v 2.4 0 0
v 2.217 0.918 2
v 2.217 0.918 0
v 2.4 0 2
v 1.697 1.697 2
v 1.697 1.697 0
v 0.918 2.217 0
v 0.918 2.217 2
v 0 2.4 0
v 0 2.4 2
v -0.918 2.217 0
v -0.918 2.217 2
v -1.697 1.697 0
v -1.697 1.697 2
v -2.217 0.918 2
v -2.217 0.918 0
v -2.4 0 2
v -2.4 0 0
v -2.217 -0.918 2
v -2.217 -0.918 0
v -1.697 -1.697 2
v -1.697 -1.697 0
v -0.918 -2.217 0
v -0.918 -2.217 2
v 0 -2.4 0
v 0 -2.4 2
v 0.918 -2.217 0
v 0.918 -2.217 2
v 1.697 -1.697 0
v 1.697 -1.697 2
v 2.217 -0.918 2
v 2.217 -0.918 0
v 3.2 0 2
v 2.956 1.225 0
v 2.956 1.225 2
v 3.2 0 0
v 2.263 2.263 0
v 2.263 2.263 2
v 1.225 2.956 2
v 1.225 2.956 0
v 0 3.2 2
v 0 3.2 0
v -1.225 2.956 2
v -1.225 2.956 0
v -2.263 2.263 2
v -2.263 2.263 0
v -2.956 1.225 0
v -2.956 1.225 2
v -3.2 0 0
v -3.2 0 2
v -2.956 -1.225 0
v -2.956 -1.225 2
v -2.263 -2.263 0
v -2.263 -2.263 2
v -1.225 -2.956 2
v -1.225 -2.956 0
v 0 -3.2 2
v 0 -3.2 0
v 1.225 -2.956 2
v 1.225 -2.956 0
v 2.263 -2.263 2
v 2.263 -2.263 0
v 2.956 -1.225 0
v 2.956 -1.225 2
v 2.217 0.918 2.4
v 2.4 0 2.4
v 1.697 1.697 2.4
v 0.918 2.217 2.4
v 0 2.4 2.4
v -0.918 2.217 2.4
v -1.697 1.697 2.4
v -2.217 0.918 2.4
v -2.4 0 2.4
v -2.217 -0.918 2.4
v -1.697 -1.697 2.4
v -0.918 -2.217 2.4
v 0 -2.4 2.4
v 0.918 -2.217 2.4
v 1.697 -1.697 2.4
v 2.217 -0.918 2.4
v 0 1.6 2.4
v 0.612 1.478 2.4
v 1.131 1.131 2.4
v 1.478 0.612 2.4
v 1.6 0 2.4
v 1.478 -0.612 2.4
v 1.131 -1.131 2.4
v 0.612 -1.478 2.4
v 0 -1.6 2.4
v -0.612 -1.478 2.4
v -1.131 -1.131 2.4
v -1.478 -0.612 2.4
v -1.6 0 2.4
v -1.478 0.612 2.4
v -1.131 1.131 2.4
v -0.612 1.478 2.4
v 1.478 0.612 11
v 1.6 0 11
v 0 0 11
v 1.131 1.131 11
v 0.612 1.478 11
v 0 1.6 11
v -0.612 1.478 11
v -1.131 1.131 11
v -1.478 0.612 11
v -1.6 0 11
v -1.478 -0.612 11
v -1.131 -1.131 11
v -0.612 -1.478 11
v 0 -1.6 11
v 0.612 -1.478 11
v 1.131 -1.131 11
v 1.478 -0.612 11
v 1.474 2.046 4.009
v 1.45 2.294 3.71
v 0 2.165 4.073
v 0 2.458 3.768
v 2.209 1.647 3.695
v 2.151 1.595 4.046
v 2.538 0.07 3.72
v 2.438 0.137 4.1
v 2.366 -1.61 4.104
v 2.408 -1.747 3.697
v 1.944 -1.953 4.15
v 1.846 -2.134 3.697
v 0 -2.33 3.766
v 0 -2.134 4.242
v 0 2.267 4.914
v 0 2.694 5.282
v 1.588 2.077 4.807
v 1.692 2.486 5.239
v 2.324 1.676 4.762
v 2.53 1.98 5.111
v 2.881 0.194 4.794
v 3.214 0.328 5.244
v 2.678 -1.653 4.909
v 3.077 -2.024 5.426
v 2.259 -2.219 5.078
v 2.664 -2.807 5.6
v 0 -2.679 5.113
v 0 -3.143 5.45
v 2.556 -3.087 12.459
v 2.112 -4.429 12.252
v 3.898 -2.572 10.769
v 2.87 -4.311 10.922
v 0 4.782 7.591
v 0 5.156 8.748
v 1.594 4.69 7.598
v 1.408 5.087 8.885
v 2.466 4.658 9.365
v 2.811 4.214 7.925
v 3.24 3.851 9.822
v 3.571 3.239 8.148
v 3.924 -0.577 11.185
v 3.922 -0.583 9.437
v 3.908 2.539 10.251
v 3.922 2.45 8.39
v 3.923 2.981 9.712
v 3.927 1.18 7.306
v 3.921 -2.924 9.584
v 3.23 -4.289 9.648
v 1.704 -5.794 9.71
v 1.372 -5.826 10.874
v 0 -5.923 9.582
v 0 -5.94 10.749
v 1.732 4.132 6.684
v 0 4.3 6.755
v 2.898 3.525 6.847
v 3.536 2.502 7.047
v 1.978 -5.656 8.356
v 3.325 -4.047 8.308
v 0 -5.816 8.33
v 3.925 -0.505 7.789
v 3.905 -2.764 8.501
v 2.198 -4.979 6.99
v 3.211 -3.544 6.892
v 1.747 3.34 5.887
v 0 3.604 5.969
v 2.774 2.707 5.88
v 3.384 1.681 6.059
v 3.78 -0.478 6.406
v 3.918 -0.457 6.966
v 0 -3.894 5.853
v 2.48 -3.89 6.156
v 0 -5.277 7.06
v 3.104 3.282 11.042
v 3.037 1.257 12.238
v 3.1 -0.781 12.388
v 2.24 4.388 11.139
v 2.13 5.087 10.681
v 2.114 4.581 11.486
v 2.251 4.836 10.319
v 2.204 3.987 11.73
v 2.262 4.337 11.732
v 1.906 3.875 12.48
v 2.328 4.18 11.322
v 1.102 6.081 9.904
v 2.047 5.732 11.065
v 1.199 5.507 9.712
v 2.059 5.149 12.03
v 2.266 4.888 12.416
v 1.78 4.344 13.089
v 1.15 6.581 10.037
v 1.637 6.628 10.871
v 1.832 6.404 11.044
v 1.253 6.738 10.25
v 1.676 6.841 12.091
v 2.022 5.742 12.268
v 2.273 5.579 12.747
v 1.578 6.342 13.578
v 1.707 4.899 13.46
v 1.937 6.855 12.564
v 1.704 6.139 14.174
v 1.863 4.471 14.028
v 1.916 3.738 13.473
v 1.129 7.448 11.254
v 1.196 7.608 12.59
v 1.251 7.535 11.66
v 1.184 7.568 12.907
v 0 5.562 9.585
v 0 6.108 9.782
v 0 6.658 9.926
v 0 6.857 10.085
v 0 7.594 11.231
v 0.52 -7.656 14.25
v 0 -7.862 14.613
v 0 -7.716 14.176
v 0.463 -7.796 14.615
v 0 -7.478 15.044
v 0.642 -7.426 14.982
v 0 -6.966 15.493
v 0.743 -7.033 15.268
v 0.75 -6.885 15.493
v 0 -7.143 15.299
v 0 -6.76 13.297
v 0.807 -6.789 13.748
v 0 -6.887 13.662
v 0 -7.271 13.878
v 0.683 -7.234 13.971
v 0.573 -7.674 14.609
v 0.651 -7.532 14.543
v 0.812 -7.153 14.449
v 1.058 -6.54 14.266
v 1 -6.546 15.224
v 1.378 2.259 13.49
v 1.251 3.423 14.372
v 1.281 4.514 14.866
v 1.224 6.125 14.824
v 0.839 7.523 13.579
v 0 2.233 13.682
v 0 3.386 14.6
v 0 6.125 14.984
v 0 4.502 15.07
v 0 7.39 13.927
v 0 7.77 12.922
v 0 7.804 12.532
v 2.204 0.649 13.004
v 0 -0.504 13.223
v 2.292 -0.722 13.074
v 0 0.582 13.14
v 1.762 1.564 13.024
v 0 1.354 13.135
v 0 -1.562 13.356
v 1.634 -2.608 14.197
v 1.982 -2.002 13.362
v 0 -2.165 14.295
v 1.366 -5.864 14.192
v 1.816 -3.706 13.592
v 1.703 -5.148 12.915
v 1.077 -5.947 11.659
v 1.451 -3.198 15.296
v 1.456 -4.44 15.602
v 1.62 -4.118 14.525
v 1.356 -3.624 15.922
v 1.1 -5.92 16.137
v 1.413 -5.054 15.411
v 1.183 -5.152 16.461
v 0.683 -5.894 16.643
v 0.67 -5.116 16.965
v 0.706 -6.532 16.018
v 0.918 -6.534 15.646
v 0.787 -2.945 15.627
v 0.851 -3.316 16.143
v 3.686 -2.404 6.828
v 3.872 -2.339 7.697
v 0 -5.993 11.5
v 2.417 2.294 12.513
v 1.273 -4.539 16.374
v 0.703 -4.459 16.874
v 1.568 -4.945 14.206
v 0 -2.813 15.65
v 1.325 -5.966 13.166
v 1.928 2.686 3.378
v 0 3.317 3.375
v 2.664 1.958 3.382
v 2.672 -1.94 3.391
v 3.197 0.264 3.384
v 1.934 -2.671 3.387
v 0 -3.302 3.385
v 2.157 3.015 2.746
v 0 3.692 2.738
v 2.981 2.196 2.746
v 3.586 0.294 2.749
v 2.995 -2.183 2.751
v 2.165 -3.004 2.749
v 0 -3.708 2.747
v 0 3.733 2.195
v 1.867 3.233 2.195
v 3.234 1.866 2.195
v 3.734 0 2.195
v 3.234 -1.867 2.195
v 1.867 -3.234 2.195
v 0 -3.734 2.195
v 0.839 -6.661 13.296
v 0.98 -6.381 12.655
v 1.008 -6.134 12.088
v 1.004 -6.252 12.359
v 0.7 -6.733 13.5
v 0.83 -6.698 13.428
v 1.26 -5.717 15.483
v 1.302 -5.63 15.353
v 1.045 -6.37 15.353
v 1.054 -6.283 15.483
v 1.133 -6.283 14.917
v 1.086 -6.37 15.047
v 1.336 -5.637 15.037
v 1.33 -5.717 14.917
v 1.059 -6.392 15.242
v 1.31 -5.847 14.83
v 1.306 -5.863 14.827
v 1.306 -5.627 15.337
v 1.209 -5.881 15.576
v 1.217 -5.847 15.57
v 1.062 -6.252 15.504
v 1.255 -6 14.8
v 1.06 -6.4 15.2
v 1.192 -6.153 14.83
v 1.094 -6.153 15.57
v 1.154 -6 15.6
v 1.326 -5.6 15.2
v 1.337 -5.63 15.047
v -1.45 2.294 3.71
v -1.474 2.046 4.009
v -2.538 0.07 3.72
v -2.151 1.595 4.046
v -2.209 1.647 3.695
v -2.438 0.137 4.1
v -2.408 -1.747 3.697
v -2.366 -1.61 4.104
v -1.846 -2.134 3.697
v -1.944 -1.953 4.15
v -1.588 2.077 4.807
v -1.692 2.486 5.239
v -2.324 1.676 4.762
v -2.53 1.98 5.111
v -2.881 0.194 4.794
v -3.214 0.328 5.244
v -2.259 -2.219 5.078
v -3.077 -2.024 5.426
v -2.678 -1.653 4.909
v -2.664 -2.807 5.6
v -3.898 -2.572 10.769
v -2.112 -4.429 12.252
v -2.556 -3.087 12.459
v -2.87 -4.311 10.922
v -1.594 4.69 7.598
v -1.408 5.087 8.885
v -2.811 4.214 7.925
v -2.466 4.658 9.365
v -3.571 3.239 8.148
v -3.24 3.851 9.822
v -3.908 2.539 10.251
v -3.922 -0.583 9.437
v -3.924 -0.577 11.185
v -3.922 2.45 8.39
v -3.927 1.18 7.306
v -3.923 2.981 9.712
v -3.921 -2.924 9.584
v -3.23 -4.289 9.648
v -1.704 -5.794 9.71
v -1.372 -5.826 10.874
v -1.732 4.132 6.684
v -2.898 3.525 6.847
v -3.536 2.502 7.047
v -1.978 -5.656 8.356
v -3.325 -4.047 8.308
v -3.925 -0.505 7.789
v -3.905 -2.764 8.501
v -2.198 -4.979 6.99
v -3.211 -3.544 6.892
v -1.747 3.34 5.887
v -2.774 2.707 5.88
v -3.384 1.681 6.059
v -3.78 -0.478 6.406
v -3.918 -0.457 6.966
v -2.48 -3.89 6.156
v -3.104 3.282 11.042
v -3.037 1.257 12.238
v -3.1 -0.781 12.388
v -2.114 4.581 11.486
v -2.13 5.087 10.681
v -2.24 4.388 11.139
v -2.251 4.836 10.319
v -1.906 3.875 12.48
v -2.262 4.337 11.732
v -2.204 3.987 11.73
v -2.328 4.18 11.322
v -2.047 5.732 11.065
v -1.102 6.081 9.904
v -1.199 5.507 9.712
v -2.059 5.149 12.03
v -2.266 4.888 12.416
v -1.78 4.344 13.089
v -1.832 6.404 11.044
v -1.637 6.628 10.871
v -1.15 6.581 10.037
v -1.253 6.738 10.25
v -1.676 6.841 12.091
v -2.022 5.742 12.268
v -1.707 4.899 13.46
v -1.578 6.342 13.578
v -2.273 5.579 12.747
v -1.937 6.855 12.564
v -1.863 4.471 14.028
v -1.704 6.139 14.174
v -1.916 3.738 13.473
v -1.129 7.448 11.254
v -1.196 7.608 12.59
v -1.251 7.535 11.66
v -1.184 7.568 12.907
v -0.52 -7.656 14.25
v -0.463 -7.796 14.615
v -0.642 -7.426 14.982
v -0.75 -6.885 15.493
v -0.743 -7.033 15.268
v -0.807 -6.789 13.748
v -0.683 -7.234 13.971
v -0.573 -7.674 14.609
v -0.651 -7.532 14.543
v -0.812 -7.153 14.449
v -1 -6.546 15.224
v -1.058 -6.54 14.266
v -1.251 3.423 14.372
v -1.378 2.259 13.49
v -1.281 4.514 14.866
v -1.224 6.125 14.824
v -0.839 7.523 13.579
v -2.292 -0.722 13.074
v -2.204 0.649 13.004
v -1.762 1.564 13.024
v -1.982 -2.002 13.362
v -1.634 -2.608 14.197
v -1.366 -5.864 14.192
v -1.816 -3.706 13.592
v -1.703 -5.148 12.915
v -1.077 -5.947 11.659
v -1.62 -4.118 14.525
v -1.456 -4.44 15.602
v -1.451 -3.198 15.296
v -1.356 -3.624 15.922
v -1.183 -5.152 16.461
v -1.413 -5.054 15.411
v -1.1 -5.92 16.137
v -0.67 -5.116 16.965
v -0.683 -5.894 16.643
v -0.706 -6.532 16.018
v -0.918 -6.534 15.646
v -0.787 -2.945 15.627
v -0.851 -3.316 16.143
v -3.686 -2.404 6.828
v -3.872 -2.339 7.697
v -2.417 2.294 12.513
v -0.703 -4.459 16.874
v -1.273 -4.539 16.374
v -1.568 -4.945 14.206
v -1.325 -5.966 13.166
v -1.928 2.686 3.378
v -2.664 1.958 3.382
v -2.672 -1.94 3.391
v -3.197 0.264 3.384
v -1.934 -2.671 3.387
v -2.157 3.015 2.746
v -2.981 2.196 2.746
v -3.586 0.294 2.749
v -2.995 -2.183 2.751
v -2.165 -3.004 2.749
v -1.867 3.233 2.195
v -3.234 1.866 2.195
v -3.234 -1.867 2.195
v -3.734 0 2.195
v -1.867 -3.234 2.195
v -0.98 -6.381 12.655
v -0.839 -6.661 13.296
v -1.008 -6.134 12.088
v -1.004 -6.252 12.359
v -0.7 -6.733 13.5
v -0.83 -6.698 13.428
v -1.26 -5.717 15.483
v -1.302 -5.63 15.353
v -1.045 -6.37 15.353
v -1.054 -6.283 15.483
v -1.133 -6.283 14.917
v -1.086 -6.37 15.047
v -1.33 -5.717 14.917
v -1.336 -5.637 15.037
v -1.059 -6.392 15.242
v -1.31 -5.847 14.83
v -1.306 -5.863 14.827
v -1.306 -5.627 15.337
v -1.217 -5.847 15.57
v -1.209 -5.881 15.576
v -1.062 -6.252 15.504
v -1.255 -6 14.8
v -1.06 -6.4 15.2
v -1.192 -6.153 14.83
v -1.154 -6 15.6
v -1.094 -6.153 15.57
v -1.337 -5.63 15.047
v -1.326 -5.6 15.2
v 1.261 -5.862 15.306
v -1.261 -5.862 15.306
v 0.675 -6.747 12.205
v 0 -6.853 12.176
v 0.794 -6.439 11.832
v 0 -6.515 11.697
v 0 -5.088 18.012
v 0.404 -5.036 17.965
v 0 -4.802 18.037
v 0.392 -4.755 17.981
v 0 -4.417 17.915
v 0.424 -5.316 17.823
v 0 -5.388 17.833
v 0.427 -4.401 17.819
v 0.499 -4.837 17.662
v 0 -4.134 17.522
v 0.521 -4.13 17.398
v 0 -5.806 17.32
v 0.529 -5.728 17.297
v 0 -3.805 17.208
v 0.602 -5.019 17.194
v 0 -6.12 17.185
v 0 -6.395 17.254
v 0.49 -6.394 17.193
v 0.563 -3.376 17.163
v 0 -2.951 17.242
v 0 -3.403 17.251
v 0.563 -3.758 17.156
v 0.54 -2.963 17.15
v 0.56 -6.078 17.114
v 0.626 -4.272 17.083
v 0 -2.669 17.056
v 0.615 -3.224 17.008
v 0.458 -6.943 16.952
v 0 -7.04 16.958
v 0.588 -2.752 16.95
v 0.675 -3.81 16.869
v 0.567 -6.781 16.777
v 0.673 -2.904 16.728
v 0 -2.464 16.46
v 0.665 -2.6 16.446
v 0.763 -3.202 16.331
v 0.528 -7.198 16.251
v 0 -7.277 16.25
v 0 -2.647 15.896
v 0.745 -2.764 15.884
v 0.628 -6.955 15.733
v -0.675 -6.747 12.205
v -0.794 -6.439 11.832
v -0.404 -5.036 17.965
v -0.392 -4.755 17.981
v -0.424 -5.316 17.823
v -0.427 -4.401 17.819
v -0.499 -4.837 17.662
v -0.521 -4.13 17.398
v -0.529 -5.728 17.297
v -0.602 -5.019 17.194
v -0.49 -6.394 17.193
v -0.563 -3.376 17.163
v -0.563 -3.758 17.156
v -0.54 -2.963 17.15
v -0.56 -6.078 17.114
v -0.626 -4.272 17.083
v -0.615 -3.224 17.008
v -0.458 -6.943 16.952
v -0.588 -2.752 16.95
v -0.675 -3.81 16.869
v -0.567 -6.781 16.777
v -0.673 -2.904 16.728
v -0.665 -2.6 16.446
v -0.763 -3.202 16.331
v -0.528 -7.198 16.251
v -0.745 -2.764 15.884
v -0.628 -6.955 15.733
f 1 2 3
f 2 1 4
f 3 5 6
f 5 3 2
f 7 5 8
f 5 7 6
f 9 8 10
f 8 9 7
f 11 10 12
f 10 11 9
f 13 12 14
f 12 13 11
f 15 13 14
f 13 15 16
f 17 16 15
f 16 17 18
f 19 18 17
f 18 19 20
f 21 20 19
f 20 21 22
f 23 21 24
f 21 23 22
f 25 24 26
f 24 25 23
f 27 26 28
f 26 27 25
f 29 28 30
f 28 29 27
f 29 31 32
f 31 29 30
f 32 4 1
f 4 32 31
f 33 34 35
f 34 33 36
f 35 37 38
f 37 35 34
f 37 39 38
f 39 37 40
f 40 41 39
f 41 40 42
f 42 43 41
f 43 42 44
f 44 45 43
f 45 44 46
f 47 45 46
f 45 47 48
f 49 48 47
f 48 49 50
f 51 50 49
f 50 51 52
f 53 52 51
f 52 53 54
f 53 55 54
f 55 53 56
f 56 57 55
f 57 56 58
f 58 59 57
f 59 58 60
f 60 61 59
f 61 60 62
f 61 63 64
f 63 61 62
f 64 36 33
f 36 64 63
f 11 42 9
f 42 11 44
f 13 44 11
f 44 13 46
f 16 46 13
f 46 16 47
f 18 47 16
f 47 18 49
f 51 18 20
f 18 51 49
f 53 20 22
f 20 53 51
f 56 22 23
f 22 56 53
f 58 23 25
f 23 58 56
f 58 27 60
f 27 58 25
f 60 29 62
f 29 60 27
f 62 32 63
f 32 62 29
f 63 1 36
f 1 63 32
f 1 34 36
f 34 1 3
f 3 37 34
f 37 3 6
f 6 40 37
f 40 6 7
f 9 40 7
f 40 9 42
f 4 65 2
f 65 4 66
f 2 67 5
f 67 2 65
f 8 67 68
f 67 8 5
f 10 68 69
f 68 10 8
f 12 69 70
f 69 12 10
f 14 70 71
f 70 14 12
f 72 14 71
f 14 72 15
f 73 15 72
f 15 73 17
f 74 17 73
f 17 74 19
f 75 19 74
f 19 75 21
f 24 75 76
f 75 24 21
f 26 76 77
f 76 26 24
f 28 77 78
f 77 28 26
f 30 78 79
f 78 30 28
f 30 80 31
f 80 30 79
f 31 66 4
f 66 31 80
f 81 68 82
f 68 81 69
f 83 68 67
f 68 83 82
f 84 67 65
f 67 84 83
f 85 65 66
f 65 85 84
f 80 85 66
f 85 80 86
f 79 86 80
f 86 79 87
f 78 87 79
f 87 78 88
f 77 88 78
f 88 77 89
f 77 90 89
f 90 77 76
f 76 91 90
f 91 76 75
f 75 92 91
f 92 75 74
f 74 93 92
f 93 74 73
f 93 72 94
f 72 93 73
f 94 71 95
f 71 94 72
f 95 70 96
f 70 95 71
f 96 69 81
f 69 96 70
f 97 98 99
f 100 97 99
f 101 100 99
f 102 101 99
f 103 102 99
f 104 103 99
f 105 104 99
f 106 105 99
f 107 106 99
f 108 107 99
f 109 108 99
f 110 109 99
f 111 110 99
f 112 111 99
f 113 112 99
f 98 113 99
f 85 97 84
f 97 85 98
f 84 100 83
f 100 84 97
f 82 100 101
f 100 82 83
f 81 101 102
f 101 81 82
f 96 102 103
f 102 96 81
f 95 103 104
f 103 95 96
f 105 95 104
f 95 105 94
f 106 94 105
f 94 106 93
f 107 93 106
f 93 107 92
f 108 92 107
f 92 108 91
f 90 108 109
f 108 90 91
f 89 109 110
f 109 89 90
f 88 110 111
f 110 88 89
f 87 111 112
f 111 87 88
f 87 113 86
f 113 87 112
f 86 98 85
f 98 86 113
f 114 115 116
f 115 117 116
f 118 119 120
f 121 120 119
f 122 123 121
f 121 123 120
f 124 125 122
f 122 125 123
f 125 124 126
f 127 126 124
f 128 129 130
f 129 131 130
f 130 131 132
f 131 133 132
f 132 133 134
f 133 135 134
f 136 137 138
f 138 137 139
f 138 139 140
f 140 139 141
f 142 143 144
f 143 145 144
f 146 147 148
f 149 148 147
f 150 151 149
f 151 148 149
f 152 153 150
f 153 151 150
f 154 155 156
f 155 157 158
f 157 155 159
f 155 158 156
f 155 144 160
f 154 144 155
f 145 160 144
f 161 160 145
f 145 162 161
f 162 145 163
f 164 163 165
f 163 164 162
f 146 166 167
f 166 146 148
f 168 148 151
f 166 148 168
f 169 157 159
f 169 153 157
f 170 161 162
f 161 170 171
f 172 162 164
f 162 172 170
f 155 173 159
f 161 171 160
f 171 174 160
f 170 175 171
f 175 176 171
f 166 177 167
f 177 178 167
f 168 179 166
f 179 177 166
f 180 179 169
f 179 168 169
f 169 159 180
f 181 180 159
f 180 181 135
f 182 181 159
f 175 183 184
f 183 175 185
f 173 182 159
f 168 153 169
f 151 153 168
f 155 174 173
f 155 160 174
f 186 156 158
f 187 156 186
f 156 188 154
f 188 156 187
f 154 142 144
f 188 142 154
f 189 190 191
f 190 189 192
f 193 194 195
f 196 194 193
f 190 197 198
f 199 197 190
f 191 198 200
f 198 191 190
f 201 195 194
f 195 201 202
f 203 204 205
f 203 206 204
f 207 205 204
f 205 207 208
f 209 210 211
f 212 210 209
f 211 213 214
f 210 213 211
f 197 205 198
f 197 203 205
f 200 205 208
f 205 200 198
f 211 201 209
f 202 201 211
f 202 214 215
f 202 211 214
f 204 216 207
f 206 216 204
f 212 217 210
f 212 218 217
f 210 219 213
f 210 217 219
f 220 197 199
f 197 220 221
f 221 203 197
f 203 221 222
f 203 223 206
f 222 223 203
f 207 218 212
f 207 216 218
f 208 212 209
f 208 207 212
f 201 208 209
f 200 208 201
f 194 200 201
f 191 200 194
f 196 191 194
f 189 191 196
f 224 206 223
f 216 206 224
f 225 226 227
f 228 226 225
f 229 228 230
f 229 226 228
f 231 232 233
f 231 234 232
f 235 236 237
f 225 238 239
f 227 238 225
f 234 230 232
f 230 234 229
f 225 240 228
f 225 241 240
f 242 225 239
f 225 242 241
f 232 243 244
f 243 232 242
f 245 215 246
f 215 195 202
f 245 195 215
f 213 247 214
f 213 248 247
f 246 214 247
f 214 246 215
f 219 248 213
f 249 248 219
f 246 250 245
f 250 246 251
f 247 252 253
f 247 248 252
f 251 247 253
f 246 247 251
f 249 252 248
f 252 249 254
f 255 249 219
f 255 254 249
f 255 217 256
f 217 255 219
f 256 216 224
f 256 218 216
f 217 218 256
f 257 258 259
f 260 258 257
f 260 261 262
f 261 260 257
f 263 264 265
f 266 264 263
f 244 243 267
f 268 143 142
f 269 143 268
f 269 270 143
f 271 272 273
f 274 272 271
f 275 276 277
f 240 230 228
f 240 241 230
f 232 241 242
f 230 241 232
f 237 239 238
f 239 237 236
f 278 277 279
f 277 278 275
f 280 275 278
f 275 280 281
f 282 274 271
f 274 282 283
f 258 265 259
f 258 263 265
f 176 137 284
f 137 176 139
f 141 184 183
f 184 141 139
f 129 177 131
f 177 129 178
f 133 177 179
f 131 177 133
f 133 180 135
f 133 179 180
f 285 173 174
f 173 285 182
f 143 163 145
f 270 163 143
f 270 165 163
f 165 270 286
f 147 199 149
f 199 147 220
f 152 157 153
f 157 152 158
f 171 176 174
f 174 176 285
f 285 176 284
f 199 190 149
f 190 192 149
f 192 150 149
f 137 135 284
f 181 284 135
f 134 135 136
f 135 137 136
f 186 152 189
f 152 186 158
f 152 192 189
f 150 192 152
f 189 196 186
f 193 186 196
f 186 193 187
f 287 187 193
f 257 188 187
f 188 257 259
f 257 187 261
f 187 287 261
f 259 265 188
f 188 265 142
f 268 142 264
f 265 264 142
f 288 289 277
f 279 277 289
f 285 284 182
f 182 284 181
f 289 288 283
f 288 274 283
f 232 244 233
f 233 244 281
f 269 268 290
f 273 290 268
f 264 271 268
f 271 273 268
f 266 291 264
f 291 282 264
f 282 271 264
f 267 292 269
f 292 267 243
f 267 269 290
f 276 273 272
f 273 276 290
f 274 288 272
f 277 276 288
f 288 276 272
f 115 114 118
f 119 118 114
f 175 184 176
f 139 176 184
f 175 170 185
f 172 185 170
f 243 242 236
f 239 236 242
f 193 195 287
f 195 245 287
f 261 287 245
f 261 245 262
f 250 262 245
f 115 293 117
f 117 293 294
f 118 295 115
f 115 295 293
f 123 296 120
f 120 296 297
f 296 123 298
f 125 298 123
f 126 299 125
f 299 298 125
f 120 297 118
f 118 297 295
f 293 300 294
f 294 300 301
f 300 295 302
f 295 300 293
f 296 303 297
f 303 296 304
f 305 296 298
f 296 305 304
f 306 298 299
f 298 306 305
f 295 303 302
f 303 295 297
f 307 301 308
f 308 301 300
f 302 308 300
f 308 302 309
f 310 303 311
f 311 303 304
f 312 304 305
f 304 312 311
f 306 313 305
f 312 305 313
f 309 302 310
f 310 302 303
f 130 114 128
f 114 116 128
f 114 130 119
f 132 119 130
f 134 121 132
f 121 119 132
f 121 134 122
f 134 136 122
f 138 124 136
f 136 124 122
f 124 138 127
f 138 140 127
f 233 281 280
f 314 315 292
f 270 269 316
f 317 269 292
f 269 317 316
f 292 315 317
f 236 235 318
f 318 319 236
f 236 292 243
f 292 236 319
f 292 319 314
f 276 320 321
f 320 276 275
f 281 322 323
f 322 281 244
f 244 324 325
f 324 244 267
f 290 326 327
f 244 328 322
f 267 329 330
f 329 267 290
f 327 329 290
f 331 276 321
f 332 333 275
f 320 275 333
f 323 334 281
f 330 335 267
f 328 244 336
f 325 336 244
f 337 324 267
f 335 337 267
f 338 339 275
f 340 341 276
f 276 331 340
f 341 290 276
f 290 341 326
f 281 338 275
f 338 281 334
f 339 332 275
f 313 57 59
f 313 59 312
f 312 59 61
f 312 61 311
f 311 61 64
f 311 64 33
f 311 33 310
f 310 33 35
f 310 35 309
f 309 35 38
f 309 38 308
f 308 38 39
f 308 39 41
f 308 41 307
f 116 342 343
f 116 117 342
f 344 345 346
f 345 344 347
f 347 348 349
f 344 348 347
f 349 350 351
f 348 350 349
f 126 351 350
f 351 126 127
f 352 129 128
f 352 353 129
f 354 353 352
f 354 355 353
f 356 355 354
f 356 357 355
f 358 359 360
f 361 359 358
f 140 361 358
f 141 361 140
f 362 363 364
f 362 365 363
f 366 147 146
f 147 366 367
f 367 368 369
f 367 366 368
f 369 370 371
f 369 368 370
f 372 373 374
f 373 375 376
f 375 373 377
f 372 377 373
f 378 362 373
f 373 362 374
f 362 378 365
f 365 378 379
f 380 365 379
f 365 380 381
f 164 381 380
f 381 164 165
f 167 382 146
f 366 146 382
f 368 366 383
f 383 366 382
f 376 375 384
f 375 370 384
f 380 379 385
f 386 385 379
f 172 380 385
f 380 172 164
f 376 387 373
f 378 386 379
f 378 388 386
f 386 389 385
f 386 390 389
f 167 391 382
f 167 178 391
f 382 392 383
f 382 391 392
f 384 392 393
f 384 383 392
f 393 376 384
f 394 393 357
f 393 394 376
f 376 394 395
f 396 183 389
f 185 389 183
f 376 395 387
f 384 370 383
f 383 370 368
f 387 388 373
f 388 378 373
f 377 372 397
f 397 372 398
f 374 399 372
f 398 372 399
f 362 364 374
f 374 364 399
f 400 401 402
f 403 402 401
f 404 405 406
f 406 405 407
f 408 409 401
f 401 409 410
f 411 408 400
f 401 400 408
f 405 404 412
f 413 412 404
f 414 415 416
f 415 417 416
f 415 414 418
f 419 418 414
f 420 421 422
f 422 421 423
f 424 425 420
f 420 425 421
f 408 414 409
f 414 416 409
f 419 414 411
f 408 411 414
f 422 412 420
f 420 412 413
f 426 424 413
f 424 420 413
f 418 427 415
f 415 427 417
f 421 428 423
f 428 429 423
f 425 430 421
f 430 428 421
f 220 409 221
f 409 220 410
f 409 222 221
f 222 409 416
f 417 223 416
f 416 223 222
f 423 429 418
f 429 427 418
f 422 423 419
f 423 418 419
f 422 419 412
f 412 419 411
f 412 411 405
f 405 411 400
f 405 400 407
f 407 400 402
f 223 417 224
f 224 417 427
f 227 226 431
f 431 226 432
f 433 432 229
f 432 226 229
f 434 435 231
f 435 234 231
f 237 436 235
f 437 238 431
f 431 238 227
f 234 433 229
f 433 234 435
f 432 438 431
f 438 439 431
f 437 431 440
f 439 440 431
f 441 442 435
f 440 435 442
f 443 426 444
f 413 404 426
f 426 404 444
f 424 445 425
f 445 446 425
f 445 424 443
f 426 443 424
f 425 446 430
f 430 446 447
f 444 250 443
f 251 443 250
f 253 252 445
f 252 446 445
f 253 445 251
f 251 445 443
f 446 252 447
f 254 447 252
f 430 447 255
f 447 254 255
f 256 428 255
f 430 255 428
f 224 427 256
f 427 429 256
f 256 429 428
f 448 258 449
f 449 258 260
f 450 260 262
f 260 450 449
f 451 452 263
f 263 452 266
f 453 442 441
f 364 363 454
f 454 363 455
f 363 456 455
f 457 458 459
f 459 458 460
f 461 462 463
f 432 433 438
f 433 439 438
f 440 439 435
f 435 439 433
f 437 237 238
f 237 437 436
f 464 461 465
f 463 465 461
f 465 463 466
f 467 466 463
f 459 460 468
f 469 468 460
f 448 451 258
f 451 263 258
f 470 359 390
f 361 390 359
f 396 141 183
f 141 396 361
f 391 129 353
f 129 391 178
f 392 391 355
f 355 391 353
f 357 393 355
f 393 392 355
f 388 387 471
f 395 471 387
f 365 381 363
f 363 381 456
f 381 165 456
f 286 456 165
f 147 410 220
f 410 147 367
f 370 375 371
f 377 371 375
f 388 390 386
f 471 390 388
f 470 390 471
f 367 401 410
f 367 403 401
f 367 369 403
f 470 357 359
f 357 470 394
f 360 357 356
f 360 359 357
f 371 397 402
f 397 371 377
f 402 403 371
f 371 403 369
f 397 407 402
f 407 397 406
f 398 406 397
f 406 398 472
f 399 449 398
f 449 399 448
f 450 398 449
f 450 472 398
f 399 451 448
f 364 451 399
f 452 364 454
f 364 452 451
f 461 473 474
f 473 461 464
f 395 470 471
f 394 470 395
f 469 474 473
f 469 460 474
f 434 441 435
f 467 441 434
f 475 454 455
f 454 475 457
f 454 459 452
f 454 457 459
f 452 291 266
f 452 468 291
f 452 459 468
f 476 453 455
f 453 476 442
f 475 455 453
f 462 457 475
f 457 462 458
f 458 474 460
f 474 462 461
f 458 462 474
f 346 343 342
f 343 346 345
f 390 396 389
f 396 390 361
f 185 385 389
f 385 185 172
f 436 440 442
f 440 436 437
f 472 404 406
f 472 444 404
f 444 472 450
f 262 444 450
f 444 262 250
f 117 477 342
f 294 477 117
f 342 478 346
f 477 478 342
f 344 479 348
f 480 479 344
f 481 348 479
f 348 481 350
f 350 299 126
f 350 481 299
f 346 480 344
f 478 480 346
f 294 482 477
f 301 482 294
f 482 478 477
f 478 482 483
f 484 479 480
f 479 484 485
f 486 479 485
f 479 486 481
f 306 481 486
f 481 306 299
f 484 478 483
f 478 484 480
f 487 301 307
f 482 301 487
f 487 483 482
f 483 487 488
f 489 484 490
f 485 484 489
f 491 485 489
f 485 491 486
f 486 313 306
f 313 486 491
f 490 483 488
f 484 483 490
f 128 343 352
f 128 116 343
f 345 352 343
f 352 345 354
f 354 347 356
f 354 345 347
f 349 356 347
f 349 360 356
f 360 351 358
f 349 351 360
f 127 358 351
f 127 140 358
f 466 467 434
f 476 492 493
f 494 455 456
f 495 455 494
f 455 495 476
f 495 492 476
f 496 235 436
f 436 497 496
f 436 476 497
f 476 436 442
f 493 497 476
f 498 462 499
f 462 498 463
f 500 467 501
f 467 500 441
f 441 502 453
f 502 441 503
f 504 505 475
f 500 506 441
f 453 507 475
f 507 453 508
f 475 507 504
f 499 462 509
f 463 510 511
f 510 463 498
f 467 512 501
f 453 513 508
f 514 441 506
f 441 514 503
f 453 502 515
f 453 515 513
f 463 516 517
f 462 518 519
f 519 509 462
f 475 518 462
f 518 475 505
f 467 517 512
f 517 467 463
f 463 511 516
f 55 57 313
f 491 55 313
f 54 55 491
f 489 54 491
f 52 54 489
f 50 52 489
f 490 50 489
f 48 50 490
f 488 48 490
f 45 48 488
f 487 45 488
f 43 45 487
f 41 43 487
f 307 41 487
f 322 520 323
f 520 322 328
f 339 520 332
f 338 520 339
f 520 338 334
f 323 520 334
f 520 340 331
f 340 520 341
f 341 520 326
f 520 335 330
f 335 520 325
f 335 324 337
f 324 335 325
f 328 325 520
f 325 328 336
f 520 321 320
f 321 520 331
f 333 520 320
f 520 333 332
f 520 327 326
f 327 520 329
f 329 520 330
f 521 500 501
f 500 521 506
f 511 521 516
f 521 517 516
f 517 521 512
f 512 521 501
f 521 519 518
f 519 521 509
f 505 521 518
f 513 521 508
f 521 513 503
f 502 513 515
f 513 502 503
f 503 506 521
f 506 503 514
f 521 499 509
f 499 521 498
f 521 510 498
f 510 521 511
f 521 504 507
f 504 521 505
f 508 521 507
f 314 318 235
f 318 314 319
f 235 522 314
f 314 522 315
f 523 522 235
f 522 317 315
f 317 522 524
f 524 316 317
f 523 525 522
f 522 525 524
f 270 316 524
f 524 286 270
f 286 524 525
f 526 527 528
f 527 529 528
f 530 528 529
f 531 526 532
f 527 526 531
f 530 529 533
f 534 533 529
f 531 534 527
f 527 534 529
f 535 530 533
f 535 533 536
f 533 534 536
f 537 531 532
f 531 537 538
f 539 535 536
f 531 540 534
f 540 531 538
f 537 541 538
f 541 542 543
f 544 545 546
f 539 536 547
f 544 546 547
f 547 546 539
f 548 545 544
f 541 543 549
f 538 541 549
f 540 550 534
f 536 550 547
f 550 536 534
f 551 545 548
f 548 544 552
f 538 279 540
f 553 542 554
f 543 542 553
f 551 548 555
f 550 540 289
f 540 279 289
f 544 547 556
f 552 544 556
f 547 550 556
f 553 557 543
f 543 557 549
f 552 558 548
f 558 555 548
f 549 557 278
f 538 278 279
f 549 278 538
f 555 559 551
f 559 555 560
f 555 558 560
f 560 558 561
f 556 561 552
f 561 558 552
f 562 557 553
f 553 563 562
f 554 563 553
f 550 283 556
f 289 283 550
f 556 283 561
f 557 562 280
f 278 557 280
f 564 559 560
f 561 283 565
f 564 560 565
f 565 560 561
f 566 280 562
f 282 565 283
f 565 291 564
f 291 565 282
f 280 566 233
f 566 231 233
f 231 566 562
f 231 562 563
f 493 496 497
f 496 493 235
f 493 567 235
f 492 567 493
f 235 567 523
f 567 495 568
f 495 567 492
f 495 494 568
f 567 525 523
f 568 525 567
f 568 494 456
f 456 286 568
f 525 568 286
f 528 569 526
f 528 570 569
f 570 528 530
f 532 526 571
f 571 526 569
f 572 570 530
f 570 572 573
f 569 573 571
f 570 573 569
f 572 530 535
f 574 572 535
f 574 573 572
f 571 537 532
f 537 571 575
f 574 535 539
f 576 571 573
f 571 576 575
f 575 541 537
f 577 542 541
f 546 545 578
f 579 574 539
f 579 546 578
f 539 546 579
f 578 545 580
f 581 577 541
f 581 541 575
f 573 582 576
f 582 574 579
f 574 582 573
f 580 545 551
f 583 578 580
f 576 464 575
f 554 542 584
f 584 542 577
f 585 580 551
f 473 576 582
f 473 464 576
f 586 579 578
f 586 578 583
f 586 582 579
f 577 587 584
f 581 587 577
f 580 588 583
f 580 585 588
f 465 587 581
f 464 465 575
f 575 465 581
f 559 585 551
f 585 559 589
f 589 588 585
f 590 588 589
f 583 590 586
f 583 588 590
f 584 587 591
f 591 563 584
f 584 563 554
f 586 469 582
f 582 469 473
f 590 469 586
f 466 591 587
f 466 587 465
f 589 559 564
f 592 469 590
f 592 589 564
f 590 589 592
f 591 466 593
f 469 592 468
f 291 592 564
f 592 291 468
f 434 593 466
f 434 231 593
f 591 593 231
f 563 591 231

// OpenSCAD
use <../lib.scad>
use <95342p01.scad>
function ldraw_lib__96094() = [
// 0 ~_Animal Chicken with Red Comb Pattern White (Obsolete)
// 0 Name: 96094.dat
// 0 Author: [PTadmin]
// 0 !LDRAW_ORG Part Physical_Colour UPDATE 2019-02
// 0 !LICENSE Licensed under CC BY 4.0 : see CAreadme.txt
// 
// 0 BFC CERTIFY CCW
  [0,"BFC","CERTIFY"],
  [0,"BFC","CCW"],
// 
// 0 !HISTORY 2011-12-29 [PTadmin] Official Update 2011-02
// 0 !HISTORY 2019-08-07 [Holly-Wood] Obsoleted per decision not to include physical colour parts
// 0 !HISTORY 2019-09-09 [PTadmin] Official Update 2019-02
// 
// 
// 0 // This file is a "shortcut" with the correct number for the actual
// 0 // colouring of the part (White).
// 
// 1 15 0 0 0 1 0 0 0 1 0 0 0 1 95342p01.dat
  [1,15,0,0,0,1,0,0,0,1,0,0,0,1, ldraw_lib__95342p01()],
];
module ldraw_lib__96094(step=0, col=false, unit=2/5, alt=false, line=0.2, solid=!$preview)
    makepoly(ldraw_lib__96094(), step=step, col=col, unit=unit, alt=alt, line=line, solid=solid);
ldraw_lib__96094(line=0.2);
